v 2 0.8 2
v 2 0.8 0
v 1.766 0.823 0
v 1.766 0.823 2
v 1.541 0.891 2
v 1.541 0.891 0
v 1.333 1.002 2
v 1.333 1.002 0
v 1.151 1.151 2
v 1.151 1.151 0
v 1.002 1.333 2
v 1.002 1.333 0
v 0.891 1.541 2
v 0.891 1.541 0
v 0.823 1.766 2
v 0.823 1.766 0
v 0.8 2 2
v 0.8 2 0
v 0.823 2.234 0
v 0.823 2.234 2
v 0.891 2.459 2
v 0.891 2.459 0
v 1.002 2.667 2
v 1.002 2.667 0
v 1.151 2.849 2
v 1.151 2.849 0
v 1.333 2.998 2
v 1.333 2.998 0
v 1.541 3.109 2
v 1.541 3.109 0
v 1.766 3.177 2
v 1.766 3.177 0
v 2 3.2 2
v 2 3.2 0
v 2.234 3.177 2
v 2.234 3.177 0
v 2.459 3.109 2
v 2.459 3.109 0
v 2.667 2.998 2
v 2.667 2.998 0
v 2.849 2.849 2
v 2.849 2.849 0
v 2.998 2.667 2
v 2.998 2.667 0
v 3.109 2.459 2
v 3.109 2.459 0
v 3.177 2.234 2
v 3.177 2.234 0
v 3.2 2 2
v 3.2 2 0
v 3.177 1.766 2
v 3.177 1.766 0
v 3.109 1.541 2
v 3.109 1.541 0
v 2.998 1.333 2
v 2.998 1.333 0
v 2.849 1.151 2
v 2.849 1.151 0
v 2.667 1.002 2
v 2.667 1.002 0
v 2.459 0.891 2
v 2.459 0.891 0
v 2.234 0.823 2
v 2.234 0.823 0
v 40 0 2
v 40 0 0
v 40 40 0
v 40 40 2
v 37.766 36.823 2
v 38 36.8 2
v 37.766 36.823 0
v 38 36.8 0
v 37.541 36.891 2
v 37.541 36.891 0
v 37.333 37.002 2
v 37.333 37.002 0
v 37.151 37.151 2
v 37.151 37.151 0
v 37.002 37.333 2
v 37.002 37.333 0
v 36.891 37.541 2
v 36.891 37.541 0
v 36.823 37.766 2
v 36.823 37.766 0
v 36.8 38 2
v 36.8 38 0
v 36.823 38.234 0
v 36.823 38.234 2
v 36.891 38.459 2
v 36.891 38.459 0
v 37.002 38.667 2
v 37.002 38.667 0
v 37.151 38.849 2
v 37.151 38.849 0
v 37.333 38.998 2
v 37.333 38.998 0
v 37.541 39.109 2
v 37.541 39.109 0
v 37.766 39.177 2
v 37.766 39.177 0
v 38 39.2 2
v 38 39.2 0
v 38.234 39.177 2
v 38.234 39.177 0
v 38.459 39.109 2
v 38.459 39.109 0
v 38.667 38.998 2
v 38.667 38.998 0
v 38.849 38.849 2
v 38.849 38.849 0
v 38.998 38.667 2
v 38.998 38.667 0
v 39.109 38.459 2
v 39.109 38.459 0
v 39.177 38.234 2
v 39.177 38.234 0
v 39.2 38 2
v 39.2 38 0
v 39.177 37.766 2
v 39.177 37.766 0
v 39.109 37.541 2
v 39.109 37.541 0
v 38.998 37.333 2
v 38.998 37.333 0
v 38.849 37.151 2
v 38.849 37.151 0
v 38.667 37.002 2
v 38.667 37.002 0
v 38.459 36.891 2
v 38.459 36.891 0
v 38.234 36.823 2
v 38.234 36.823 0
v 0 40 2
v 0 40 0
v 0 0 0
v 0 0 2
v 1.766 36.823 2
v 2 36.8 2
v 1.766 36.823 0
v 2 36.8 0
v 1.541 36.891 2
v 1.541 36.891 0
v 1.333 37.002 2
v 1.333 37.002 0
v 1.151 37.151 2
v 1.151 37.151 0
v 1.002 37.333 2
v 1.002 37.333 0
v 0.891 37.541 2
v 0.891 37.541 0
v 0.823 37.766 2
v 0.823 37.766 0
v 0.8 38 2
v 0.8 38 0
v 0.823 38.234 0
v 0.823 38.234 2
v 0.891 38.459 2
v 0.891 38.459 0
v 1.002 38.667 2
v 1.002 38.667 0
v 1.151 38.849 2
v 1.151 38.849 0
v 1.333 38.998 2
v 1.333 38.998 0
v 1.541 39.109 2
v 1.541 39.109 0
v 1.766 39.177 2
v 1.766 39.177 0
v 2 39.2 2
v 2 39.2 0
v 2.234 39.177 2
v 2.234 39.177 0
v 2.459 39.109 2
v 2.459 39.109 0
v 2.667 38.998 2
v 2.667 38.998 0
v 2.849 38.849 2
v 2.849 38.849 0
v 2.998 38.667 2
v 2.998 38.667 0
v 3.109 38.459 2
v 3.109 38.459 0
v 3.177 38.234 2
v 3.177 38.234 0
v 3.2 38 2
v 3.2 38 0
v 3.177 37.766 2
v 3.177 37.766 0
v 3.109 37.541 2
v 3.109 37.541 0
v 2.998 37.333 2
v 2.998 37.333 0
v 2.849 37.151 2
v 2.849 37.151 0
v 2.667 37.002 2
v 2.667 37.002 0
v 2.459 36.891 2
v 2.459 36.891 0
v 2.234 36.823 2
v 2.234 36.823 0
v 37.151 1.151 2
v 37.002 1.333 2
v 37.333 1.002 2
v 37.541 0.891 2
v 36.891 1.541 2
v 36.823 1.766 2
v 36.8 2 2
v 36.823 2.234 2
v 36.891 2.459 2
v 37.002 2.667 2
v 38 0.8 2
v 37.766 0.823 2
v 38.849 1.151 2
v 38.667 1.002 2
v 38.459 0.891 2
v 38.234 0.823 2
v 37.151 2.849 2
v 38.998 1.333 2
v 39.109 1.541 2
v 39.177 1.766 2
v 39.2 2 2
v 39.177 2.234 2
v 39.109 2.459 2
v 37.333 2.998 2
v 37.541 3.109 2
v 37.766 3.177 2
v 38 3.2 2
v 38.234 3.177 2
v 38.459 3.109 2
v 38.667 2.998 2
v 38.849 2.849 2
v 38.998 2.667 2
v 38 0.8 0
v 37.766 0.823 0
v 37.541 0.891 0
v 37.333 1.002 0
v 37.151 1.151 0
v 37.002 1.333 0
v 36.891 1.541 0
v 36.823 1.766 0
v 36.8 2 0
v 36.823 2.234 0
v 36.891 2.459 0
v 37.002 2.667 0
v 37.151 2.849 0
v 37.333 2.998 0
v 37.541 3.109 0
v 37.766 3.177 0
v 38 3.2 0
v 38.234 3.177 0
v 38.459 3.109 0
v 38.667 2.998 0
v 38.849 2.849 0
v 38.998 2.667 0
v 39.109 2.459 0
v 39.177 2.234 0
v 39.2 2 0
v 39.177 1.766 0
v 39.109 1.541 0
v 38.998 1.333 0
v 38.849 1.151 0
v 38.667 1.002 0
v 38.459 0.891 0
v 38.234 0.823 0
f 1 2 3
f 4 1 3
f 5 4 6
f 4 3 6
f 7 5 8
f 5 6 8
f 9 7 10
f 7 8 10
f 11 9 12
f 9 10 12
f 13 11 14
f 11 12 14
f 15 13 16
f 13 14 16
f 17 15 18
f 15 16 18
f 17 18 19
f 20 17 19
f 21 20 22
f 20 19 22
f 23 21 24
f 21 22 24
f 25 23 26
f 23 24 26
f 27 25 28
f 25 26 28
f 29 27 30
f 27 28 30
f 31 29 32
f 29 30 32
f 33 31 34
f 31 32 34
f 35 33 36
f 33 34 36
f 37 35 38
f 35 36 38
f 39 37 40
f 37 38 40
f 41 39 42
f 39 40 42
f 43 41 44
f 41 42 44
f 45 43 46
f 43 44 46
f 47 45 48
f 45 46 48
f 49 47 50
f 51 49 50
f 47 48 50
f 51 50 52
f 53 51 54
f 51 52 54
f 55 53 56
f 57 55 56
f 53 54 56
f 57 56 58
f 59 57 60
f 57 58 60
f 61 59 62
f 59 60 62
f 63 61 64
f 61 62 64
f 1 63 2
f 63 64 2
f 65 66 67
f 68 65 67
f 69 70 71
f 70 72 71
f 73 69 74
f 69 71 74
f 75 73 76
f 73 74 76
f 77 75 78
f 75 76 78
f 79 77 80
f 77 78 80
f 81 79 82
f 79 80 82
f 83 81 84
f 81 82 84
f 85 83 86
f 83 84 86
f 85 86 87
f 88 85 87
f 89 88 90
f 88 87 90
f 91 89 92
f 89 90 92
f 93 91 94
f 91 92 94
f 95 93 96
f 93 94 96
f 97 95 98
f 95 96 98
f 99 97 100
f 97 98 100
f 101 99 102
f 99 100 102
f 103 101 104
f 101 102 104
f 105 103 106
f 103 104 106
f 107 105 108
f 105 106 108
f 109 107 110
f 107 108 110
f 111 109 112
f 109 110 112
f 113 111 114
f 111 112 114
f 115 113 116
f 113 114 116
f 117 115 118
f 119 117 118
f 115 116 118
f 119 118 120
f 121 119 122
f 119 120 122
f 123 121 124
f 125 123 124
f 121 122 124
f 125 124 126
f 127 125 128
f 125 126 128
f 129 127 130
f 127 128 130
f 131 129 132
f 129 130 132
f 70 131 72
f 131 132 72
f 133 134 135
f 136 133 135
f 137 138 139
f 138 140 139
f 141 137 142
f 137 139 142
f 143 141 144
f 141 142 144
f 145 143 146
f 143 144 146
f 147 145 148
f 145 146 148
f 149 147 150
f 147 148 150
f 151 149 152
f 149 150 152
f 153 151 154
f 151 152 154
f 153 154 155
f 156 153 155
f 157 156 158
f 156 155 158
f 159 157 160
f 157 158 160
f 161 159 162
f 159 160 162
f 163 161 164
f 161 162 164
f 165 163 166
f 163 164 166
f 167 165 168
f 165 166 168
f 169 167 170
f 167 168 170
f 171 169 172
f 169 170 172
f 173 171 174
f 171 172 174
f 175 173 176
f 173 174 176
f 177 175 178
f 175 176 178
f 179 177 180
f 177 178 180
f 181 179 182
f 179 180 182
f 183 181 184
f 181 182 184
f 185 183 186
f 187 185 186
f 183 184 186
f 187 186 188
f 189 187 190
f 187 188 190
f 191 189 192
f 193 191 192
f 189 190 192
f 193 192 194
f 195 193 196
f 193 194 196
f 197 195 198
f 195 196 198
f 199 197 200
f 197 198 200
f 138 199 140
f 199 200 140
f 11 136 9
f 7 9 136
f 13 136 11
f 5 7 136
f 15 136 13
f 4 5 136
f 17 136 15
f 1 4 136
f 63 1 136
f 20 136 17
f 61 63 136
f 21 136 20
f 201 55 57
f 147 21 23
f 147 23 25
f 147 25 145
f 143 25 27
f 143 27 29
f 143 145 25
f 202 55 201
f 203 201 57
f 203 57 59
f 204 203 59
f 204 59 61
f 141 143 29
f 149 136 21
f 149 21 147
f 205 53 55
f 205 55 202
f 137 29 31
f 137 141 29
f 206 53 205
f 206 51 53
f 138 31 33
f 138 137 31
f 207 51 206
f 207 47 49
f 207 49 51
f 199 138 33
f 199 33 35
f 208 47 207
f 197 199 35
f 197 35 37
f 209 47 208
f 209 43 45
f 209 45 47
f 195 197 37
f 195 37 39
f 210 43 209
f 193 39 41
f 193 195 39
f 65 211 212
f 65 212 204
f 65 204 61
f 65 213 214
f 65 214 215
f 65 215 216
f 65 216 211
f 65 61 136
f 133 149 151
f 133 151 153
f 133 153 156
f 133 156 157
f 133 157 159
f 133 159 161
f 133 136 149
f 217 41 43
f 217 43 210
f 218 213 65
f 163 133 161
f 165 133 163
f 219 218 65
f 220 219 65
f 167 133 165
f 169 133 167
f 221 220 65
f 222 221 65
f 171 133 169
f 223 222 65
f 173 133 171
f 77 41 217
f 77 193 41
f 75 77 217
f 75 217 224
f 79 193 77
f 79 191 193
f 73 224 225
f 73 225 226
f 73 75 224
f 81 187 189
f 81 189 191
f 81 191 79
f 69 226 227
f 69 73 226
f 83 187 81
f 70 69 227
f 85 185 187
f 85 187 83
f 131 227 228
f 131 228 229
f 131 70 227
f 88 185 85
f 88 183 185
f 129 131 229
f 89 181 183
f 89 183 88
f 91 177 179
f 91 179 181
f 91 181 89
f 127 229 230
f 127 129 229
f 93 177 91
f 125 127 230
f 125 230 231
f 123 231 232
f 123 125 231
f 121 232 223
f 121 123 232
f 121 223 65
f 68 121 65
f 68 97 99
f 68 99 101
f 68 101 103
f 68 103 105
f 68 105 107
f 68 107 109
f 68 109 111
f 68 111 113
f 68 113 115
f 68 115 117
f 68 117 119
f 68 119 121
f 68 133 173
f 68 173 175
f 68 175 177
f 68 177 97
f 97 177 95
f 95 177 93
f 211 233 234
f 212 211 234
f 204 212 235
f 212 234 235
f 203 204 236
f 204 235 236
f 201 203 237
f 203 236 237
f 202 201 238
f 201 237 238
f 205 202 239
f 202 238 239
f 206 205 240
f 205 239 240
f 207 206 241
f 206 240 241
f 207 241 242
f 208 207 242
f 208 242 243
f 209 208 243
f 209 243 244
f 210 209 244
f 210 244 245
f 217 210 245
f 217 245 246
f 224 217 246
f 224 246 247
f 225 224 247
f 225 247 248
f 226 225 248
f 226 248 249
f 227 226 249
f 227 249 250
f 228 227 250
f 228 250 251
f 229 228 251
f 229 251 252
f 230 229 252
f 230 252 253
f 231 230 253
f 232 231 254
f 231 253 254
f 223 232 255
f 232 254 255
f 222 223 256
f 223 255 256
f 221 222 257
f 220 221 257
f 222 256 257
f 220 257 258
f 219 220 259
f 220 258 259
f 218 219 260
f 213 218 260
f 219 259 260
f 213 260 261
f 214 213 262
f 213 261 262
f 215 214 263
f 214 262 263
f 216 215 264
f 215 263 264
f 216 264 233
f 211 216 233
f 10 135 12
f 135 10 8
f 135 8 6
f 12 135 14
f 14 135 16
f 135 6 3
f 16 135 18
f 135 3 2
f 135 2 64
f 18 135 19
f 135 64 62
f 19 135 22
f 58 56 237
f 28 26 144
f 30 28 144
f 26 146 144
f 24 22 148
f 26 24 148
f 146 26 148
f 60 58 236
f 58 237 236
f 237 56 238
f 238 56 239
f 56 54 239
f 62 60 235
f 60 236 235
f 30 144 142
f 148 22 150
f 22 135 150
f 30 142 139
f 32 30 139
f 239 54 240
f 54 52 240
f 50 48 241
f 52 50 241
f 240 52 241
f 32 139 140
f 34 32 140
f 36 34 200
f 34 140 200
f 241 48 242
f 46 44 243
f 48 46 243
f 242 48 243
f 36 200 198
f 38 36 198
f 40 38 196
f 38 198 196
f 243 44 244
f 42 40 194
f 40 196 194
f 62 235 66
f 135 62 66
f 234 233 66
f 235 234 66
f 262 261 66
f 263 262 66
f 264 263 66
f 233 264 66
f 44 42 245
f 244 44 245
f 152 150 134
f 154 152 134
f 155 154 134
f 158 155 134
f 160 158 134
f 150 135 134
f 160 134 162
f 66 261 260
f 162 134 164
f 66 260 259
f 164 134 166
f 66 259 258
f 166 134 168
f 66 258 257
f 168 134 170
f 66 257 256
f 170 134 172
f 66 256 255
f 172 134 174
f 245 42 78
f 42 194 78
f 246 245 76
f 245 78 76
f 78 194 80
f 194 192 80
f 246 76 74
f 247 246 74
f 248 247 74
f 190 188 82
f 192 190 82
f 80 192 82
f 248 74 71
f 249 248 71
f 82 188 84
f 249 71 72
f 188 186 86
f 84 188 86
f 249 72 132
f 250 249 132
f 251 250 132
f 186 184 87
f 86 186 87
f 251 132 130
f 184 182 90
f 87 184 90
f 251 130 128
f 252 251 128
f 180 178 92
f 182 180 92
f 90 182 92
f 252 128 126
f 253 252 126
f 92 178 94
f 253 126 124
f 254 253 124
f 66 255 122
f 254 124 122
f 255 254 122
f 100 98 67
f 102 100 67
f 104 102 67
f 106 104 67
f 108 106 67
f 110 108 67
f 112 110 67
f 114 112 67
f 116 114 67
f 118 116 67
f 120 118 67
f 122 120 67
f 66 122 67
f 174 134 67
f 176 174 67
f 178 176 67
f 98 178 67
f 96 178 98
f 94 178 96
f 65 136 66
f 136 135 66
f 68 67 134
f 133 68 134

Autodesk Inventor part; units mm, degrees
ref_plane "YZ Plane" through (0, 0, 0) normal (1, 0, 0) x (0, 1, 0)
ref_plane "XZ Plane" through (0, 0, 0) normal (0, 1, 0) x (-1, 0, 0)
ref_plane "XY Plane" through (0, 0, 0) normal (0, 0, 1) x (1, 0, 0)
sketch "Skizze1" plane through (0, 0, 0) normal (0, 0, 1) x (1, 0, 0)
  line L0 (0, 0) -> (40, 0)
  line L1 (40, 0) -> (40, 40)
  line L2 (40, 40) -> (0, 40)
  line L3 (0, 40) -> (0, 0)
  dimension "d0" = 40
  dimension "d1" = 40
extrude "Extrusion1" add sketch "Skizze1" along normal blind 2
sketch "Skizze3" plane through (0, 0, 2) normal (0, 0, 1) x (1, 0, 0)
  line L0 (0, 0) -> (0, 40) projected
  line L1 (40, 0) -> (0, 0) projected
  line L2 (40, 40) -> (40, 0) projected
  line L3 (0, 40) -> (40, 40) projected
  line L4 (36, 36) -> (36, 4)
  line L5 (36, 4) -> (4, 4)
  line L6 (4, 4) -> (4, 36)
  line L7 (4, 36) -> (36, 36)
  line L8 (38, 38) -> (38, 2)
  line L9 (38, 2) -> (2, 2)
  line L10 (2, 2) -> (2, 38)
  line L11 (2, 38) -> (38, 38)
  dimension "d14" = 4
  dimension "d15" = 2
hole "Bohrung2" at (38, 38, 2) at (2, 38, 2) at (2, 2, 2) at (38, 2, 2) direction (0, 0, -1) diameter 2.4 end through all
properties part number "13_0204_004-1"
